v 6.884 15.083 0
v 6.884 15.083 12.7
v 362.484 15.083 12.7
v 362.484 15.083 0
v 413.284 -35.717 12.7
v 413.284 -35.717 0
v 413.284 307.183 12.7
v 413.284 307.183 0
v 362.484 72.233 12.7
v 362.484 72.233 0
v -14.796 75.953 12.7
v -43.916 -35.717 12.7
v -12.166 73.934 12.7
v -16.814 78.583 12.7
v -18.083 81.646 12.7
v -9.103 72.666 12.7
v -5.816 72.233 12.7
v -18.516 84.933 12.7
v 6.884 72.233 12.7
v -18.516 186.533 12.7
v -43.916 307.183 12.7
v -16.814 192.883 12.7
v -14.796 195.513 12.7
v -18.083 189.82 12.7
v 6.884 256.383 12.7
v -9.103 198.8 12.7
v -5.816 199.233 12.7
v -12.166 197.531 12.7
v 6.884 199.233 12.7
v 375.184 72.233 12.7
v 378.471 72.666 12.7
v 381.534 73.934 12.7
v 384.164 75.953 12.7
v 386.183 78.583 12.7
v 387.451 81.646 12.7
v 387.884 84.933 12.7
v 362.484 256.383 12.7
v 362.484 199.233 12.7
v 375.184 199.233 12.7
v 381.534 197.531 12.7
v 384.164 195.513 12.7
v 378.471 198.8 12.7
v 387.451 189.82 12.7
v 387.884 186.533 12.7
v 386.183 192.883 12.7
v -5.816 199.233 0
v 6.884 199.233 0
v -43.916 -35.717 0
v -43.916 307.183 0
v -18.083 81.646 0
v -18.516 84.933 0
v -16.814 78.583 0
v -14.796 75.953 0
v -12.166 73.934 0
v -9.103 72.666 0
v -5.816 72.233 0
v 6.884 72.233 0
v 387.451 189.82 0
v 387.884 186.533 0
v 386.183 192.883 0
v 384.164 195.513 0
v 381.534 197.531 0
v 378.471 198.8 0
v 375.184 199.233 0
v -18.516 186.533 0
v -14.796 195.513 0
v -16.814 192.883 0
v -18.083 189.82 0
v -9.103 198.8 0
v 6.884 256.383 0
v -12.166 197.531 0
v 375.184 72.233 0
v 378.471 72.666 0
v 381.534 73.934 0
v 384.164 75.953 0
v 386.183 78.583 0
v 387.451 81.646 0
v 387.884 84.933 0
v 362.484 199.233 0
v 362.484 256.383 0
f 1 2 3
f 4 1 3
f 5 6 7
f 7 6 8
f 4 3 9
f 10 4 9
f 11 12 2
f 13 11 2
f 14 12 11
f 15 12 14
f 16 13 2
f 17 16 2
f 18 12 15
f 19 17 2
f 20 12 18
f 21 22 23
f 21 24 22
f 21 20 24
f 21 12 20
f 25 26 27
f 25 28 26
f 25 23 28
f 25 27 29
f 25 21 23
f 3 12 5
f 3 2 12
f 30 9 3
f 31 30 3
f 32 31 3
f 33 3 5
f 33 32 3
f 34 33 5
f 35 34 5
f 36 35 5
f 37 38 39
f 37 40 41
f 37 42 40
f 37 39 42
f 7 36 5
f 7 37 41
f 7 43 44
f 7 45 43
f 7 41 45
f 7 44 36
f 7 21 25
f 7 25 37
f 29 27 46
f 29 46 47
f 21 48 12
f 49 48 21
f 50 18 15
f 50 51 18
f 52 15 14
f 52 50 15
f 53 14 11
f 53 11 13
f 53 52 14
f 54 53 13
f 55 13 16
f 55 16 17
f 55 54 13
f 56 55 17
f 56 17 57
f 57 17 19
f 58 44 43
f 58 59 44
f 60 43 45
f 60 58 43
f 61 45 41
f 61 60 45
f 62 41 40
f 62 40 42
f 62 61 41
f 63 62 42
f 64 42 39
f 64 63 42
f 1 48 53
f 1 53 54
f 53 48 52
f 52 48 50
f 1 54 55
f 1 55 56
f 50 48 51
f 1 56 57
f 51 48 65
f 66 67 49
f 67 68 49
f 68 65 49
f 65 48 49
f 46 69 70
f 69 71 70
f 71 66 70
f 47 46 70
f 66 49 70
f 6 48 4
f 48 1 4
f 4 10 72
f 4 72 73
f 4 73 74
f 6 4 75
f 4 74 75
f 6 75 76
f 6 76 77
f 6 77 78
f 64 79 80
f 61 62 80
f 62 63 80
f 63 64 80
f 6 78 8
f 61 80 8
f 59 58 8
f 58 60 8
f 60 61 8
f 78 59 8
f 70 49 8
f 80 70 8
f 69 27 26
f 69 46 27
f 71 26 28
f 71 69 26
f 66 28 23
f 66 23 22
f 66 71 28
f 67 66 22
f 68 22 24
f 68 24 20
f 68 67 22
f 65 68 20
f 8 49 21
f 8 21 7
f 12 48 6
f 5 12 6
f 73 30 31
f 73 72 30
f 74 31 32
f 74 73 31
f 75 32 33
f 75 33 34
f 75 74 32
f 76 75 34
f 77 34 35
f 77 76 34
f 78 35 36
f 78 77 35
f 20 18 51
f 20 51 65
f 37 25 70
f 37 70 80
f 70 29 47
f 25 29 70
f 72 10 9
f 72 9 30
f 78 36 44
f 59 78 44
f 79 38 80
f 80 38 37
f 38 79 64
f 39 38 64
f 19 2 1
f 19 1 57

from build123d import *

# Parameters (mm, degrees)
F0_W     = 457.2
F0_H     = 342.9
F1_DEPTH = 12.7
F2_W     = 355.6
F2_H     = 241.3
F3_DEPTH = 25.4
F4_W     = 25.4
F4_H     = 127
F5_DEPTH = 25.4
F6_R     = 12.7


with BuildPart() as f1:
    # F0 (on Top) → F1 (new body)
    with BuildSketch(Plane.XY):
        with Locations((184.6840278864, 135.7329336226)):
            Rectangle(F0_W, F0_H)
    extrude(amount=F1_DEPTH)

    # F2 (on face) → F3 (cut)
    with BuildSketch(Plane.XY.offset(12.7)):
        with Locations((184.6840278864, 135.7329336226)):
            Rectangle(F2_W, F2_H)
    extrude(amount=-F3_DEPTH, mode=Mode.SUBTRACT)

    # F4 (on face) → F5 (cut)
    with BuildSketch(Plane.XY.offset(12.7)):
        with Locations((-5.8159721136, 135.7329336226)):
            Rectangle(F4_W, F4_H)
        with Locations((375.1840278864, 135.7329336226)):
            Rectangle(F4_W, F4_H)
    extrude(amount=-F5_DEPTH, mode=Mode.SUBTRACT)

    # F6
    f6_edges = [f1.edges().sort_by_distance(p)[0] for p in [
        (-18.515972, 199.232934, 6.35),
        (387.884028, 199.232934, 6.35),
        (-18.515972, 72.232934, 6.35),
        (387.884028, 72.232934, 6.35),
    ]]
    fillet(f6_edges, radius=F6_R)


solid = f1.part
